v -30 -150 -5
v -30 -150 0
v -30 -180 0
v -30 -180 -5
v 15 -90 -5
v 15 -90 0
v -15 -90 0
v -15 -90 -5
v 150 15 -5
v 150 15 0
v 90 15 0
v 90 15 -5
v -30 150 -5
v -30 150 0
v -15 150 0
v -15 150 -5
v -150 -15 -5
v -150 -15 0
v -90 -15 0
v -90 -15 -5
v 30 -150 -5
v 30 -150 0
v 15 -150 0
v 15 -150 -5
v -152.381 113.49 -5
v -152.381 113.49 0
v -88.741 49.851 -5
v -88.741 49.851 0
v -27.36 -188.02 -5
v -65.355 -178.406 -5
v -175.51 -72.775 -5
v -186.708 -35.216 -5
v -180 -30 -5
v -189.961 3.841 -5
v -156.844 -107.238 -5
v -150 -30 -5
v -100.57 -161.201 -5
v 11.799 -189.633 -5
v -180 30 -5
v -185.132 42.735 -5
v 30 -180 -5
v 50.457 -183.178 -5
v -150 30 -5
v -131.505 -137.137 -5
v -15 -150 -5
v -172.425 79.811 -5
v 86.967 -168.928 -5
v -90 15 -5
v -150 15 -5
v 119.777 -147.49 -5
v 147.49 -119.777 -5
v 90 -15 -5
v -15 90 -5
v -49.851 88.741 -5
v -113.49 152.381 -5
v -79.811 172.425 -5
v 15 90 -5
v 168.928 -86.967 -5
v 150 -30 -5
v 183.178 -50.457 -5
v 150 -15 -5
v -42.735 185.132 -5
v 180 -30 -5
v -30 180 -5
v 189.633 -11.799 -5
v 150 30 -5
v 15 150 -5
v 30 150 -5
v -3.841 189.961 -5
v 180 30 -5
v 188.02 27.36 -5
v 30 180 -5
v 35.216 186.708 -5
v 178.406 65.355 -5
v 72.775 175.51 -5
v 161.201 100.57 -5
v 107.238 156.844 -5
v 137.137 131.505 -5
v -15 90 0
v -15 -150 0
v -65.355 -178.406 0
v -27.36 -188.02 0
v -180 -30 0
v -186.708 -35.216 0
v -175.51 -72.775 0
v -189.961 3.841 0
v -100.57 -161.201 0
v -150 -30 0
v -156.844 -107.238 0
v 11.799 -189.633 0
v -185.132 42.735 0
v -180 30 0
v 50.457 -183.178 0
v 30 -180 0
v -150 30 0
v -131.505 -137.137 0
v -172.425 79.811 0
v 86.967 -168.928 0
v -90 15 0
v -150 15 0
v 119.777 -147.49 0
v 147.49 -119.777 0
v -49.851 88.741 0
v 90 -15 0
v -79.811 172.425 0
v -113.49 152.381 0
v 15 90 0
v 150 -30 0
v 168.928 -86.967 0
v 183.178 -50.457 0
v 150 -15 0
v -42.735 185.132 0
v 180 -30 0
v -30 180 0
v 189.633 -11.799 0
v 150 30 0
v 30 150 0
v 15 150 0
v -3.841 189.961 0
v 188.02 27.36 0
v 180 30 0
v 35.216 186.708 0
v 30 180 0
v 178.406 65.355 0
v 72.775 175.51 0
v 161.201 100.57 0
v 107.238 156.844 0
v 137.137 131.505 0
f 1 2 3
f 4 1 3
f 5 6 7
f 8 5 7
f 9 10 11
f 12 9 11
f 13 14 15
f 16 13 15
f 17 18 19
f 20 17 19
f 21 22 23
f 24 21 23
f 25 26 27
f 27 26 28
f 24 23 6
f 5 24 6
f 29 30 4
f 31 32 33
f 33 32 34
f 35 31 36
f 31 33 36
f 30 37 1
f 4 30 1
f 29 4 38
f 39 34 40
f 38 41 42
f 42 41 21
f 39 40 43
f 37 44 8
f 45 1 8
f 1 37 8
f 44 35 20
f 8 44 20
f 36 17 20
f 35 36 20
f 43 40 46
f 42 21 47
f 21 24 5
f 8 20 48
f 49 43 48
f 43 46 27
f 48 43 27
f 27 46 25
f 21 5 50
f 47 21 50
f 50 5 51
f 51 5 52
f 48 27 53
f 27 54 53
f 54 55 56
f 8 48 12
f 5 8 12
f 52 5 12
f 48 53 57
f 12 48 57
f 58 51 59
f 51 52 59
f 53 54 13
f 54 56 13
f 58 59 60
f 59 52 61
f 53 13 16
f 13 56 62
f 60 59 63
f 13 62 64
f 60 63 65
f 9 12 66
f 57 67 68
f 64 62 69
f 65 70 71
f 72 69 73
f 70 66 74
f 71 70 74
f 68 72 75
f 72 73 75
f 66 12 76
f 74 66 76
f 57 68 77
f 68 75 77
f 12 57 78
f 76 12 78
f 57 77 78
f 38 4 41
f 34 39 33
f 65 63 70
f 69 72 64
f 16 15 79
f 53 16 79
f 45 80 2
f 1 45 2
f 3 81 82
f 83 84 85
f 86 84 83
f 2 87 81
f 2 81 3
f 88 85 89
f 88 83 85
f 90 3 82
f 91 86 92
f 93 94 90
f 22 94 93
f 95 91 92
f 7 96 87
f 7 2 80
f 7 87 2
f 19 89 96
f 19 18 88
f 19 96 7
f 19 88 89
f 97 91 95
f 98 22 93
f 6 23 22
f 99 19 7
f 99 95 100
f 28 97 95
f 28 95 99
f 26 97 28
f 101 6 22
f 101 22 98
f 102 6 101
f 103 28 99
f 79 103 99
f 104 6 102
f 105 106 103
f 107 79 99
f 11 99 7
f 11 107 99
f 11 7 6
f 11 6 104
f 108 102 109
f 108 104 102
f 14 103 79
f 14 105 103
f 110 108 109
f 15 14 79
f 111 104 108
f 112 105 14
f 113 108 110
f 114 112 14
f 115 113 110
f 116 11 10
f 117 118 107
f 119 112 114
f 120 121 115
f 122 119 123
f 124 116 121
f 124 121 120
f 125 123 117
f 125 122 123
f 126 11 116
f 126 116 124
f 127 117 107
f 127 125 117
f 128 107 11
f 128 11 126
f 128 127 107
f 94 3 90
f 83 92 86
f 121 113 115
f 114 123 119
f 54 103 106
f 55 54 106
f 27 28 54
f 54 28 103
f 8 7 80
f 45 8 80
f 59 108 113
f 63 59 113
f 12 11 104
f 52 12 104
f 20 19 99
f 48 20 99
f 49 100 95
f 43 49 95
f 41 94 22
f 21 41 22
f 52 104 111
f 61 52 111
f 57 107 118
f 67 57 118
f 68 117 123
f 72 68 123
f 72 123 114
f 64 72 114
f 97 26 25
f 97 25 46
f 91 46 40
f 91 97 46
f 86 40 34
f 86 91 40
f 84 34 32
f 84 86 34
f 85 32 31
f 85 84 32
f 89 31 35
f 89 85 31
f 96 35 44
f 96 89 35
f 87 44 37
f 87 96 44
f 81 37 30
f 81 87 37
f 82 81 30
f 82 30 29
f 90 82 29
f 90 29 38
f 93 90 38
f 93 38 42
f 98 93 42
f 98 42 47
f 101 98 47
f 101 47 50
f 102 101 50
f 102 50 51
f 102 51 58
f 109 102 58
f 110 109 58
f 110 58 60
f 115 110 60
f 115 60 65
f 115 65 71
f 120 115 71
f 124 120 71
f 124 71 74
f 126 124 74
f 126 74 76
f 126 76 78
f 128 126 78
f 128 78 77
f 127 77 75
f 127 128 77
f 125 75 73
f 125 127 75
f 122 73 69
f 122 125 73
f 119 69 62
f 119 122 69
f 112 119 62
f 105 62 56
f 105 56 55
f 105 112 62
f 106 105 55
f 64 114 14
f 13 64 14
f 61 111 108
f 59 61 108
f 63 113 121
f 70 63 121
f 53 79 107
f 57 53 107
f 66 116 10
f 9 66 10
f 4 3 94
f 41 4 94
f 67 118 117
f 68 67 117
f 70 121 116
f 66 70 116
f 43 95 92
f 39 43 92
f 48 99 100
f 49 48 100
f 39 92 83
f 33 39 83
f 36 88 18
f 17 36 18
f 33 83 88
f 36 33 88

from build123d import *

# Parameters (mm, degrees)
ESQUISSE1_R             = 190
BOSS_EXTRU_1_DEPTH      = 5
ENL_V_MAT_EXTRU_1_DEPTH = 5
ENL_V_MAT_EXTRU_2_DEPTH = 10


with BuildPart() as part:
    # Esquisse1 → Boss.-Extru.1 (new body)
    with BuildSketch(Plane.XY):
        Circle(ESQUISSE1_R)
    extrude(amount=-BOSS_EXTRU_1_DEPTH)

    # Esquisse2 → Enlèv. mat.-Extru.1 (cut)
    with BuildSketch(Plane.XY):
        Polygon((-15, 150), (-15, 90), (15, 90), (15, 150), (30, 150), (30, 180), (-30, 180), (-30, 150), align=None)
        Polygon((30, -180), (30, -150), (15, -150), (15, -90), (-15, -90), (-15, -150), (-30, -150), (-30, -180), align=None)
        Polygon((180, 30), (150, 30), (150, 15), (90, 15), (90, -15), (150, -15), (150, -30), (180, -30), align=None)
        Polygon((-180, -30), (-150, -30), (-150, -15), (-90, -15), (-90, 15), (-150, 15), (-150, 30), (-180, 30), align=None)
    extrude(amount=-ENL_V_MAT_EXTRU_1_DEPTH, mode=Mode.SUBTRACT)

    # Esquisse3 → Enlèv. mat.-Extru.2 (cut)
    with BuildSketch(Plane.XY):
        Polygon((-88.741430887, 49.850557922), (-49.850557922, 88.741430887), (-113.490168229, 152.381041194), (-120.561236041, 159.452109006), (-159.452109006, 120.561236041), (-152.381041194, 113.490168229), align=None)
    extrude(amount=-ENL_V_MAT_EXTRU_2_DEPTH, mode=Mode.SUBTRACT)


solid = part.part
